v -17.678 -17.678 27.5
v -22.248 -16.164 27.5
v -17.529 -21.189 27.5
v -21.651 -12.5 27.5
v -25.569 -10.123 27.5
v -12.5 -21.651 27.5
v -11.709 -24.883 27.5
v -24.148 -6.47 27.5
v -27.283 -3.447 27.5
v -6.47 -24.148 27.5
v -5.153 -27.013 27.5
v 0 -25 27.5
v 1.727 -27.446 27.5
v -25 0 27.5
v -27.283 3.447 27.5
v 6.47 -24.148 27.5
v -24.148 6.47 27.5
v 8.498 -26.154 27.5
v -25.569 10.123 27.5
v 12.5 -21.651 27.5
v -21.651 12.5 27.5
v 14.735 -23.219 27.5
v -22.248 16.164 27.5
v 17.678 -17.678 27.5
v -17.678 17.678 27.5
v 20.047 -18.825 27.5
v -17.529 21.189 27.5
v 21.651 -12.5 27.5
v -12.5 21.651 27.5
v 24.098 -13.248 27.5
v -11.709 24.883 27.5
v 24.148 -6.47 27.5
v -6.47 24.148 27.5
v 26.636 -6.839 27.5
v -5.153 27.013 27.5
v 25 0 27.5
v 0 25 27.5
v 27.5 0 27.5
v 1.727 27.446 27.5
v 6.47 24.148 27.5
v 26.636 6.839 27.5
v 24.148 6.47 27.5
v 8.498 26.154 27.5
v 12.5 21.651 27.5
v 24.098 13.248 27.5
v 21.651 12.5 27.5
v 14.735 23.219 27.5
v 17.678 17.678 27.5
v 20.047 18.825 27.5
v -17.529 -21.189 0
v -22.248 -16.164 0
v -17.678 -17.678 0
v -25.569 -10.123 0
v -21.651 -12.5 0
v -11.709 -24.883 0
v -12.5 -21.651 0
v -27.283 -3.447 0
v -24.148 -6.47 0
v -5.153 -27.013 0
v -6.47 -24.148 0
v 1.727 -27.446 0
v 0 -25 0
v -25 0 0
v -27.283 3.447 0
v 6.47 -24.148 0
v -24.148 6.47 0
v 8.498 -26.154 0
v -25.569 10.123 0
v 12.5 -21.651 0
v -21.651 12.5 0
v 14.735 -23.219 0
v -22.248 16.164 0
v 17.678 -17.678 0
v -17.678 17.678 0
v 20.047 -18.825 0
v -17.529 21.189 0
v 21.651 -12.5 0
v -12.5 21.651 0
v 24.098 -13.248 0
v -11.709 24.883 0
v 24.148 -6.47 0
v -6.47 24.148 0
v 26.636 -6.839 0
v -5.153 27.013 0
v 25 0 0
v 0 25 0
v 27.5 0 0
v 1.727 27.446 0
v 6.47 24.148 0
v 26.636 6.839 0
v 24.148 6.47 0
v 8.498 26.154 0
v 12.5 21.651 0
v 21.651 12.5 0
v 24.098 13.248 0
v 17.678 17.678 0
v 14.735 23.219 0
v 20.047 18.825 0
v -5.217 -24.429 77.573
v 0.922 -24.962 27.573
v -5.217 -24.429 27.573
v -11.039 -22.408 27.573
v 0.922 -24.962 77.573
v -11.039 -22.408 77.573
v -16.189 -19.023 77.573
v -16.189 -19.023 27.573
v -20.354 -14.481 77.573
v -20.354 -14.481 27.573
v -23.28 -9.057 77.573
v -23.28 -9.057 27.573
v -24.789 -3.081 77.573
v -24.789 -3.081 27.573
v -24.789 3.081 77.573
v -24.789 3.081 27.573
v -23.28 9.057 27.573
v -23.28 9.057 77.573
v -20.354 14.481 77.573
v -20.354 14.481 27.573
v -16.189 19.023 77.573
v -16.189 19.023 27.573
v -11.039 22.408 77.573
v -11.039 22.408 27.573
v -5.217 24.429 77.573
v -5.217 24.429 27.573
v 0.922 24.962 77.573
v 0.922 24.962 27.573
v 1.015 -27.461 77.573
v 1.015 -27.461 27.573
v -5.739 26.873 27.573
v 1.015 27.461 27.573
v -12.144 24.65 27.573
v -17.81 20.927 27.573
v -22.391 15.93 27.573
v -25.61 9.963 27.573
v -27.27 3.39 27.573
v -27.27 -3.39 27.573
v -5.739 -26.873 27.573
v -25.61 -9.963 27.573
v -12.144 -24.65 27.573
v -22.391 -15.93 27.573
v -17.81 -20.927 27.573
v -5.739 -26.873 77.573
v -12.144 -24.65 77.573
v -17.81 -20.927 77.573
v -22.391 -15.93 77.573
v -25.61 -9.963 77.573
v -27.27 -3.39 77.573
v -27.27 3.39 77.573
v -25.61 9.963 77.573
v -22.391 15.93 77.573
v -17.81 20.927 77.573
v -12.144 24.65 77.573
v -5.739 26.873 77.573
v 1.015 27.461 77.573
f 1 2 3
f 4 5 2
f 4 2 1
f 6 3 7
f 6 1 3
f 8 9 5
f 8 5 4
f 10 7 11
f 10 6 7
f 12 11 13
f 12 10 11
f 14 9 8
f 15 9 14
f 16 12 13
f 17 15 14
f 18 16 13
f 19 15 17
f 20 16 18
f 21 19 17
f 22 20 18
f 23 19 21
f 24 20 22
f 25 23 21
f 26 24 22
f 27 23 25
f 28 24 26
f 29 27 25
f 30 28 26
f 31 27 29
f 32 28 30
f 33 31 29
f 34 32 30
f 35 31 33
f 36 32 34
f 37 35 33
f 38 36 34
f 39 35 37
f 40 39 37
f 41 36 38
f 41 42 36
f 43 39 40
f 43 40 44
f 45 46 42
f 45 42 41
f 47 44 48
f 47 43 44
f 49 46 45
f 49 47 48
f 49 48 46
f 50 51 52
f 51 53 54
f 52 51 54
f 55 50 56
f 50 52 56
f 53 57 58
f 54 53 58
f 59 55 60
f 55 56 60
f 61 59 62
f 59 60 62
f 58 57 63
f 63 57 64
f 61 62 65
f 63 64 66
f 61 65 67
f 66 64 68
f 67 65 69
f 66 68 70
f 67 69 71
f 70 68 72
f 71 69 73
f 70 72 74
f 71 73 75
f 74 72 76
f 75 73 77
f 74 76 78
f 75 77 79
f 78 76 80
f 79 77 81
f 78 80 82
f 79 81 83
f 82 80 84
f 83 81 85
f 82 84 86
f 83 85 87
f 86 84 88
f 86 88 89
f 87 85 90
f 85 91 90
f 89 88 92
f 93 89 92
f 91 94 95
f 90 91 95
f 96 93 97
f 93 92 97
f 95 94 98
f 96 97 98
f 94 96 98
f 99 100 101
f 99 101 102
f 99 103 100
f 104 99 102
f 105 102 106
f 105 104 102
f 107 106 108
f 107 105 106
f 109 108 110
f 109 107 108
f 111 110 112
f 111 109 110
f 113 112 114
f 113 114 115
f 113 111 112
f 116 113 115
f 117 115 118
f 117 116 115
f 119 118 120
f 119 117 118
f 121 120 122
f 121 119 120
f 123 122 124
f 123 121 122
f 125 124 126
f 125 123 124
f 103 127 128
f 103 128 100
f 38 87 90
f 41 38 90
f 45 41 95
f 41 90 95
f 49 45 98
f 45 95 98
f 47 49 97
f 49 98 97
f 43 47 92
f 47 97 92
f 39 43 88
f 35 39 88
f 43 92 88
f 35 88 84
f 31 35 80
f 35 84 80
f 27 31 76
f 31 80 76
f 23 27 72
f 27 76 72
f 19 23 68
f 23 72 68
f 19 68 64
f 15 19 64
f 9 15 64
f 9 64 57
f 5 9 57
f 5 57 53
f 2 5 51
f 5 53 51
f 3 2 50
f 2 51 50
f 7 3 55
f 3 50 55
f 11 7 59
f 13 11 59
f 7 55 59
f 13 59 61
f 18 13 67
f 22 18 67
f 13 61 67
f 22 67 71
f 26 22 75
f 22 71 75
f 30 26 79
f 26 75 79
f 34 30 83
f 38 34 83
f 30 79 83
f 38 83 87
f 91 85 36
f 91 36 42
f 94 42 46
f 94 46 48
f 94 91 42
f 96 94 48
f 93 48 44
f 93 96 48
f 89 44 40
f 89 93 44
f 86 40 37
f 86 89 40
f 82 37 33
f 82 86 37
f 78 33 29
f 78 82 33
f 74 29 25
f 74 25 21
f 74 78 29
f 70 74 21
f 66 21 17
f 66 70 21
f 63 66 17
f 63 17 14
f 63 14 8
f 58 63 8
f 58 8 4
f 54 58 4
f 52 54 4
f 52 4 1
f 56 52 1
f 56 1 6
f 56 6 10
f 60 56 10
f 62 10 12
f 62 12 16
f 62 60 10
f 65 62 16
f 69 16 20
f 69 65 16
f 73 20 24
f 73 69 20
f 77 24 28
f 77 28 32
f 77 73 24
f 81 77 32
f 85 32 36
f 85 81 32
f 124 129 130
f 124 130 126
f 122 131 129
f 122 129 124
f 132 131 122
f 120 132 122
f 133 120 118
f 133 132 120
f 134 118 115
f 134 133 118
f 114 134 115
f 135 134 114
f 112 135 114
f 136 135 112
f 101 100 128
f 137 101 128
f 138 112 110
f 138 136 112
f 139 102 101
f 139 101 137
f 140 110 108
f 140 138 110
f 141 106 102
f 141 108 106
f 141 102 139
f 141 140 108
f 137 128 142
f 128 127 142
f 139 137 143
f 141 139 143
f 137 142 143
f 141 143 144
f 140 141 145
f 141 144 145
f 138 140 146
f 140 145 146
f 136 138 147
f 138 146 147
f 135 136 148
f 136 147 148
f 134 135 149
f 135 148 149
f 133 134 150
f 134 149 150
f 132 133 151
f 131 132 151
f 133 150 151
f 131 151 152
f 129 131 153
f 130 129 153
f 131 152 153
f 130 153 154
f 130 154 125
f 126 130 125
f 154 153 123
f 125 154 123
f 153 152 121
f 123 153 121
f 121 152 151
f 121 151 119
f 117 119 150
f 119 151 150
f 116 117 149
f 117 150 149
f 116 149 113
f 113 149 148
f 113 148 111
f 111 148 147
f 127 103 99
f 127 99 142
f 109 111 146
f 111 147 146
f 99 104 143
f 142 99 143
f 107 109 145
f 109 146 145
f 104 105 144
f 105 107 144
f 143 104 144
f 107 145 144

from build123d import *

# Parameters (mm, degrees)
F0_R          = 27.5
F0_R_2        = 25
F1_DEPTH      = 27.5
F2_W          = 2.5
F2_H          = 50
F3_ANGLE_BACK = 92.1160547881
F3_ANGLE      = 184.2321095762


# Not quite as in the source:
# - a feature of the source that left no trace in its solid (it failed there, or was rolled back) is left out


with BuildPart() as f1:
    # F0 (on Top) → F1 (new body)
    with BuildSketch(Plane.XY):
        Circle(F0_R)
        Circle(F0_R_2, mode=Mode.SUBTRACT)
    extrude(amount=F1_DEPTH)


with BuildPart() as f3:
    # F2 (on Front) → F3 (revolve)
    with BuildSketch(Plane.XZ, mode=Mode.PRIVATE) as f3_sk:
        with Locations((-26.2295312434, 52.5726281106)):
            Rectangle(F2_W, F2_H)
    revolve(f3_sk.sketch.rotate(Axis((0, 0, 0), (0, 0, -1)), -F3_ANGLE_BACK), axis=Axis((0, 0, 0), (0, 0, -1)), revolution_arc=F3_ANGLE)


solid = Compound([f1.part, f3.part])
